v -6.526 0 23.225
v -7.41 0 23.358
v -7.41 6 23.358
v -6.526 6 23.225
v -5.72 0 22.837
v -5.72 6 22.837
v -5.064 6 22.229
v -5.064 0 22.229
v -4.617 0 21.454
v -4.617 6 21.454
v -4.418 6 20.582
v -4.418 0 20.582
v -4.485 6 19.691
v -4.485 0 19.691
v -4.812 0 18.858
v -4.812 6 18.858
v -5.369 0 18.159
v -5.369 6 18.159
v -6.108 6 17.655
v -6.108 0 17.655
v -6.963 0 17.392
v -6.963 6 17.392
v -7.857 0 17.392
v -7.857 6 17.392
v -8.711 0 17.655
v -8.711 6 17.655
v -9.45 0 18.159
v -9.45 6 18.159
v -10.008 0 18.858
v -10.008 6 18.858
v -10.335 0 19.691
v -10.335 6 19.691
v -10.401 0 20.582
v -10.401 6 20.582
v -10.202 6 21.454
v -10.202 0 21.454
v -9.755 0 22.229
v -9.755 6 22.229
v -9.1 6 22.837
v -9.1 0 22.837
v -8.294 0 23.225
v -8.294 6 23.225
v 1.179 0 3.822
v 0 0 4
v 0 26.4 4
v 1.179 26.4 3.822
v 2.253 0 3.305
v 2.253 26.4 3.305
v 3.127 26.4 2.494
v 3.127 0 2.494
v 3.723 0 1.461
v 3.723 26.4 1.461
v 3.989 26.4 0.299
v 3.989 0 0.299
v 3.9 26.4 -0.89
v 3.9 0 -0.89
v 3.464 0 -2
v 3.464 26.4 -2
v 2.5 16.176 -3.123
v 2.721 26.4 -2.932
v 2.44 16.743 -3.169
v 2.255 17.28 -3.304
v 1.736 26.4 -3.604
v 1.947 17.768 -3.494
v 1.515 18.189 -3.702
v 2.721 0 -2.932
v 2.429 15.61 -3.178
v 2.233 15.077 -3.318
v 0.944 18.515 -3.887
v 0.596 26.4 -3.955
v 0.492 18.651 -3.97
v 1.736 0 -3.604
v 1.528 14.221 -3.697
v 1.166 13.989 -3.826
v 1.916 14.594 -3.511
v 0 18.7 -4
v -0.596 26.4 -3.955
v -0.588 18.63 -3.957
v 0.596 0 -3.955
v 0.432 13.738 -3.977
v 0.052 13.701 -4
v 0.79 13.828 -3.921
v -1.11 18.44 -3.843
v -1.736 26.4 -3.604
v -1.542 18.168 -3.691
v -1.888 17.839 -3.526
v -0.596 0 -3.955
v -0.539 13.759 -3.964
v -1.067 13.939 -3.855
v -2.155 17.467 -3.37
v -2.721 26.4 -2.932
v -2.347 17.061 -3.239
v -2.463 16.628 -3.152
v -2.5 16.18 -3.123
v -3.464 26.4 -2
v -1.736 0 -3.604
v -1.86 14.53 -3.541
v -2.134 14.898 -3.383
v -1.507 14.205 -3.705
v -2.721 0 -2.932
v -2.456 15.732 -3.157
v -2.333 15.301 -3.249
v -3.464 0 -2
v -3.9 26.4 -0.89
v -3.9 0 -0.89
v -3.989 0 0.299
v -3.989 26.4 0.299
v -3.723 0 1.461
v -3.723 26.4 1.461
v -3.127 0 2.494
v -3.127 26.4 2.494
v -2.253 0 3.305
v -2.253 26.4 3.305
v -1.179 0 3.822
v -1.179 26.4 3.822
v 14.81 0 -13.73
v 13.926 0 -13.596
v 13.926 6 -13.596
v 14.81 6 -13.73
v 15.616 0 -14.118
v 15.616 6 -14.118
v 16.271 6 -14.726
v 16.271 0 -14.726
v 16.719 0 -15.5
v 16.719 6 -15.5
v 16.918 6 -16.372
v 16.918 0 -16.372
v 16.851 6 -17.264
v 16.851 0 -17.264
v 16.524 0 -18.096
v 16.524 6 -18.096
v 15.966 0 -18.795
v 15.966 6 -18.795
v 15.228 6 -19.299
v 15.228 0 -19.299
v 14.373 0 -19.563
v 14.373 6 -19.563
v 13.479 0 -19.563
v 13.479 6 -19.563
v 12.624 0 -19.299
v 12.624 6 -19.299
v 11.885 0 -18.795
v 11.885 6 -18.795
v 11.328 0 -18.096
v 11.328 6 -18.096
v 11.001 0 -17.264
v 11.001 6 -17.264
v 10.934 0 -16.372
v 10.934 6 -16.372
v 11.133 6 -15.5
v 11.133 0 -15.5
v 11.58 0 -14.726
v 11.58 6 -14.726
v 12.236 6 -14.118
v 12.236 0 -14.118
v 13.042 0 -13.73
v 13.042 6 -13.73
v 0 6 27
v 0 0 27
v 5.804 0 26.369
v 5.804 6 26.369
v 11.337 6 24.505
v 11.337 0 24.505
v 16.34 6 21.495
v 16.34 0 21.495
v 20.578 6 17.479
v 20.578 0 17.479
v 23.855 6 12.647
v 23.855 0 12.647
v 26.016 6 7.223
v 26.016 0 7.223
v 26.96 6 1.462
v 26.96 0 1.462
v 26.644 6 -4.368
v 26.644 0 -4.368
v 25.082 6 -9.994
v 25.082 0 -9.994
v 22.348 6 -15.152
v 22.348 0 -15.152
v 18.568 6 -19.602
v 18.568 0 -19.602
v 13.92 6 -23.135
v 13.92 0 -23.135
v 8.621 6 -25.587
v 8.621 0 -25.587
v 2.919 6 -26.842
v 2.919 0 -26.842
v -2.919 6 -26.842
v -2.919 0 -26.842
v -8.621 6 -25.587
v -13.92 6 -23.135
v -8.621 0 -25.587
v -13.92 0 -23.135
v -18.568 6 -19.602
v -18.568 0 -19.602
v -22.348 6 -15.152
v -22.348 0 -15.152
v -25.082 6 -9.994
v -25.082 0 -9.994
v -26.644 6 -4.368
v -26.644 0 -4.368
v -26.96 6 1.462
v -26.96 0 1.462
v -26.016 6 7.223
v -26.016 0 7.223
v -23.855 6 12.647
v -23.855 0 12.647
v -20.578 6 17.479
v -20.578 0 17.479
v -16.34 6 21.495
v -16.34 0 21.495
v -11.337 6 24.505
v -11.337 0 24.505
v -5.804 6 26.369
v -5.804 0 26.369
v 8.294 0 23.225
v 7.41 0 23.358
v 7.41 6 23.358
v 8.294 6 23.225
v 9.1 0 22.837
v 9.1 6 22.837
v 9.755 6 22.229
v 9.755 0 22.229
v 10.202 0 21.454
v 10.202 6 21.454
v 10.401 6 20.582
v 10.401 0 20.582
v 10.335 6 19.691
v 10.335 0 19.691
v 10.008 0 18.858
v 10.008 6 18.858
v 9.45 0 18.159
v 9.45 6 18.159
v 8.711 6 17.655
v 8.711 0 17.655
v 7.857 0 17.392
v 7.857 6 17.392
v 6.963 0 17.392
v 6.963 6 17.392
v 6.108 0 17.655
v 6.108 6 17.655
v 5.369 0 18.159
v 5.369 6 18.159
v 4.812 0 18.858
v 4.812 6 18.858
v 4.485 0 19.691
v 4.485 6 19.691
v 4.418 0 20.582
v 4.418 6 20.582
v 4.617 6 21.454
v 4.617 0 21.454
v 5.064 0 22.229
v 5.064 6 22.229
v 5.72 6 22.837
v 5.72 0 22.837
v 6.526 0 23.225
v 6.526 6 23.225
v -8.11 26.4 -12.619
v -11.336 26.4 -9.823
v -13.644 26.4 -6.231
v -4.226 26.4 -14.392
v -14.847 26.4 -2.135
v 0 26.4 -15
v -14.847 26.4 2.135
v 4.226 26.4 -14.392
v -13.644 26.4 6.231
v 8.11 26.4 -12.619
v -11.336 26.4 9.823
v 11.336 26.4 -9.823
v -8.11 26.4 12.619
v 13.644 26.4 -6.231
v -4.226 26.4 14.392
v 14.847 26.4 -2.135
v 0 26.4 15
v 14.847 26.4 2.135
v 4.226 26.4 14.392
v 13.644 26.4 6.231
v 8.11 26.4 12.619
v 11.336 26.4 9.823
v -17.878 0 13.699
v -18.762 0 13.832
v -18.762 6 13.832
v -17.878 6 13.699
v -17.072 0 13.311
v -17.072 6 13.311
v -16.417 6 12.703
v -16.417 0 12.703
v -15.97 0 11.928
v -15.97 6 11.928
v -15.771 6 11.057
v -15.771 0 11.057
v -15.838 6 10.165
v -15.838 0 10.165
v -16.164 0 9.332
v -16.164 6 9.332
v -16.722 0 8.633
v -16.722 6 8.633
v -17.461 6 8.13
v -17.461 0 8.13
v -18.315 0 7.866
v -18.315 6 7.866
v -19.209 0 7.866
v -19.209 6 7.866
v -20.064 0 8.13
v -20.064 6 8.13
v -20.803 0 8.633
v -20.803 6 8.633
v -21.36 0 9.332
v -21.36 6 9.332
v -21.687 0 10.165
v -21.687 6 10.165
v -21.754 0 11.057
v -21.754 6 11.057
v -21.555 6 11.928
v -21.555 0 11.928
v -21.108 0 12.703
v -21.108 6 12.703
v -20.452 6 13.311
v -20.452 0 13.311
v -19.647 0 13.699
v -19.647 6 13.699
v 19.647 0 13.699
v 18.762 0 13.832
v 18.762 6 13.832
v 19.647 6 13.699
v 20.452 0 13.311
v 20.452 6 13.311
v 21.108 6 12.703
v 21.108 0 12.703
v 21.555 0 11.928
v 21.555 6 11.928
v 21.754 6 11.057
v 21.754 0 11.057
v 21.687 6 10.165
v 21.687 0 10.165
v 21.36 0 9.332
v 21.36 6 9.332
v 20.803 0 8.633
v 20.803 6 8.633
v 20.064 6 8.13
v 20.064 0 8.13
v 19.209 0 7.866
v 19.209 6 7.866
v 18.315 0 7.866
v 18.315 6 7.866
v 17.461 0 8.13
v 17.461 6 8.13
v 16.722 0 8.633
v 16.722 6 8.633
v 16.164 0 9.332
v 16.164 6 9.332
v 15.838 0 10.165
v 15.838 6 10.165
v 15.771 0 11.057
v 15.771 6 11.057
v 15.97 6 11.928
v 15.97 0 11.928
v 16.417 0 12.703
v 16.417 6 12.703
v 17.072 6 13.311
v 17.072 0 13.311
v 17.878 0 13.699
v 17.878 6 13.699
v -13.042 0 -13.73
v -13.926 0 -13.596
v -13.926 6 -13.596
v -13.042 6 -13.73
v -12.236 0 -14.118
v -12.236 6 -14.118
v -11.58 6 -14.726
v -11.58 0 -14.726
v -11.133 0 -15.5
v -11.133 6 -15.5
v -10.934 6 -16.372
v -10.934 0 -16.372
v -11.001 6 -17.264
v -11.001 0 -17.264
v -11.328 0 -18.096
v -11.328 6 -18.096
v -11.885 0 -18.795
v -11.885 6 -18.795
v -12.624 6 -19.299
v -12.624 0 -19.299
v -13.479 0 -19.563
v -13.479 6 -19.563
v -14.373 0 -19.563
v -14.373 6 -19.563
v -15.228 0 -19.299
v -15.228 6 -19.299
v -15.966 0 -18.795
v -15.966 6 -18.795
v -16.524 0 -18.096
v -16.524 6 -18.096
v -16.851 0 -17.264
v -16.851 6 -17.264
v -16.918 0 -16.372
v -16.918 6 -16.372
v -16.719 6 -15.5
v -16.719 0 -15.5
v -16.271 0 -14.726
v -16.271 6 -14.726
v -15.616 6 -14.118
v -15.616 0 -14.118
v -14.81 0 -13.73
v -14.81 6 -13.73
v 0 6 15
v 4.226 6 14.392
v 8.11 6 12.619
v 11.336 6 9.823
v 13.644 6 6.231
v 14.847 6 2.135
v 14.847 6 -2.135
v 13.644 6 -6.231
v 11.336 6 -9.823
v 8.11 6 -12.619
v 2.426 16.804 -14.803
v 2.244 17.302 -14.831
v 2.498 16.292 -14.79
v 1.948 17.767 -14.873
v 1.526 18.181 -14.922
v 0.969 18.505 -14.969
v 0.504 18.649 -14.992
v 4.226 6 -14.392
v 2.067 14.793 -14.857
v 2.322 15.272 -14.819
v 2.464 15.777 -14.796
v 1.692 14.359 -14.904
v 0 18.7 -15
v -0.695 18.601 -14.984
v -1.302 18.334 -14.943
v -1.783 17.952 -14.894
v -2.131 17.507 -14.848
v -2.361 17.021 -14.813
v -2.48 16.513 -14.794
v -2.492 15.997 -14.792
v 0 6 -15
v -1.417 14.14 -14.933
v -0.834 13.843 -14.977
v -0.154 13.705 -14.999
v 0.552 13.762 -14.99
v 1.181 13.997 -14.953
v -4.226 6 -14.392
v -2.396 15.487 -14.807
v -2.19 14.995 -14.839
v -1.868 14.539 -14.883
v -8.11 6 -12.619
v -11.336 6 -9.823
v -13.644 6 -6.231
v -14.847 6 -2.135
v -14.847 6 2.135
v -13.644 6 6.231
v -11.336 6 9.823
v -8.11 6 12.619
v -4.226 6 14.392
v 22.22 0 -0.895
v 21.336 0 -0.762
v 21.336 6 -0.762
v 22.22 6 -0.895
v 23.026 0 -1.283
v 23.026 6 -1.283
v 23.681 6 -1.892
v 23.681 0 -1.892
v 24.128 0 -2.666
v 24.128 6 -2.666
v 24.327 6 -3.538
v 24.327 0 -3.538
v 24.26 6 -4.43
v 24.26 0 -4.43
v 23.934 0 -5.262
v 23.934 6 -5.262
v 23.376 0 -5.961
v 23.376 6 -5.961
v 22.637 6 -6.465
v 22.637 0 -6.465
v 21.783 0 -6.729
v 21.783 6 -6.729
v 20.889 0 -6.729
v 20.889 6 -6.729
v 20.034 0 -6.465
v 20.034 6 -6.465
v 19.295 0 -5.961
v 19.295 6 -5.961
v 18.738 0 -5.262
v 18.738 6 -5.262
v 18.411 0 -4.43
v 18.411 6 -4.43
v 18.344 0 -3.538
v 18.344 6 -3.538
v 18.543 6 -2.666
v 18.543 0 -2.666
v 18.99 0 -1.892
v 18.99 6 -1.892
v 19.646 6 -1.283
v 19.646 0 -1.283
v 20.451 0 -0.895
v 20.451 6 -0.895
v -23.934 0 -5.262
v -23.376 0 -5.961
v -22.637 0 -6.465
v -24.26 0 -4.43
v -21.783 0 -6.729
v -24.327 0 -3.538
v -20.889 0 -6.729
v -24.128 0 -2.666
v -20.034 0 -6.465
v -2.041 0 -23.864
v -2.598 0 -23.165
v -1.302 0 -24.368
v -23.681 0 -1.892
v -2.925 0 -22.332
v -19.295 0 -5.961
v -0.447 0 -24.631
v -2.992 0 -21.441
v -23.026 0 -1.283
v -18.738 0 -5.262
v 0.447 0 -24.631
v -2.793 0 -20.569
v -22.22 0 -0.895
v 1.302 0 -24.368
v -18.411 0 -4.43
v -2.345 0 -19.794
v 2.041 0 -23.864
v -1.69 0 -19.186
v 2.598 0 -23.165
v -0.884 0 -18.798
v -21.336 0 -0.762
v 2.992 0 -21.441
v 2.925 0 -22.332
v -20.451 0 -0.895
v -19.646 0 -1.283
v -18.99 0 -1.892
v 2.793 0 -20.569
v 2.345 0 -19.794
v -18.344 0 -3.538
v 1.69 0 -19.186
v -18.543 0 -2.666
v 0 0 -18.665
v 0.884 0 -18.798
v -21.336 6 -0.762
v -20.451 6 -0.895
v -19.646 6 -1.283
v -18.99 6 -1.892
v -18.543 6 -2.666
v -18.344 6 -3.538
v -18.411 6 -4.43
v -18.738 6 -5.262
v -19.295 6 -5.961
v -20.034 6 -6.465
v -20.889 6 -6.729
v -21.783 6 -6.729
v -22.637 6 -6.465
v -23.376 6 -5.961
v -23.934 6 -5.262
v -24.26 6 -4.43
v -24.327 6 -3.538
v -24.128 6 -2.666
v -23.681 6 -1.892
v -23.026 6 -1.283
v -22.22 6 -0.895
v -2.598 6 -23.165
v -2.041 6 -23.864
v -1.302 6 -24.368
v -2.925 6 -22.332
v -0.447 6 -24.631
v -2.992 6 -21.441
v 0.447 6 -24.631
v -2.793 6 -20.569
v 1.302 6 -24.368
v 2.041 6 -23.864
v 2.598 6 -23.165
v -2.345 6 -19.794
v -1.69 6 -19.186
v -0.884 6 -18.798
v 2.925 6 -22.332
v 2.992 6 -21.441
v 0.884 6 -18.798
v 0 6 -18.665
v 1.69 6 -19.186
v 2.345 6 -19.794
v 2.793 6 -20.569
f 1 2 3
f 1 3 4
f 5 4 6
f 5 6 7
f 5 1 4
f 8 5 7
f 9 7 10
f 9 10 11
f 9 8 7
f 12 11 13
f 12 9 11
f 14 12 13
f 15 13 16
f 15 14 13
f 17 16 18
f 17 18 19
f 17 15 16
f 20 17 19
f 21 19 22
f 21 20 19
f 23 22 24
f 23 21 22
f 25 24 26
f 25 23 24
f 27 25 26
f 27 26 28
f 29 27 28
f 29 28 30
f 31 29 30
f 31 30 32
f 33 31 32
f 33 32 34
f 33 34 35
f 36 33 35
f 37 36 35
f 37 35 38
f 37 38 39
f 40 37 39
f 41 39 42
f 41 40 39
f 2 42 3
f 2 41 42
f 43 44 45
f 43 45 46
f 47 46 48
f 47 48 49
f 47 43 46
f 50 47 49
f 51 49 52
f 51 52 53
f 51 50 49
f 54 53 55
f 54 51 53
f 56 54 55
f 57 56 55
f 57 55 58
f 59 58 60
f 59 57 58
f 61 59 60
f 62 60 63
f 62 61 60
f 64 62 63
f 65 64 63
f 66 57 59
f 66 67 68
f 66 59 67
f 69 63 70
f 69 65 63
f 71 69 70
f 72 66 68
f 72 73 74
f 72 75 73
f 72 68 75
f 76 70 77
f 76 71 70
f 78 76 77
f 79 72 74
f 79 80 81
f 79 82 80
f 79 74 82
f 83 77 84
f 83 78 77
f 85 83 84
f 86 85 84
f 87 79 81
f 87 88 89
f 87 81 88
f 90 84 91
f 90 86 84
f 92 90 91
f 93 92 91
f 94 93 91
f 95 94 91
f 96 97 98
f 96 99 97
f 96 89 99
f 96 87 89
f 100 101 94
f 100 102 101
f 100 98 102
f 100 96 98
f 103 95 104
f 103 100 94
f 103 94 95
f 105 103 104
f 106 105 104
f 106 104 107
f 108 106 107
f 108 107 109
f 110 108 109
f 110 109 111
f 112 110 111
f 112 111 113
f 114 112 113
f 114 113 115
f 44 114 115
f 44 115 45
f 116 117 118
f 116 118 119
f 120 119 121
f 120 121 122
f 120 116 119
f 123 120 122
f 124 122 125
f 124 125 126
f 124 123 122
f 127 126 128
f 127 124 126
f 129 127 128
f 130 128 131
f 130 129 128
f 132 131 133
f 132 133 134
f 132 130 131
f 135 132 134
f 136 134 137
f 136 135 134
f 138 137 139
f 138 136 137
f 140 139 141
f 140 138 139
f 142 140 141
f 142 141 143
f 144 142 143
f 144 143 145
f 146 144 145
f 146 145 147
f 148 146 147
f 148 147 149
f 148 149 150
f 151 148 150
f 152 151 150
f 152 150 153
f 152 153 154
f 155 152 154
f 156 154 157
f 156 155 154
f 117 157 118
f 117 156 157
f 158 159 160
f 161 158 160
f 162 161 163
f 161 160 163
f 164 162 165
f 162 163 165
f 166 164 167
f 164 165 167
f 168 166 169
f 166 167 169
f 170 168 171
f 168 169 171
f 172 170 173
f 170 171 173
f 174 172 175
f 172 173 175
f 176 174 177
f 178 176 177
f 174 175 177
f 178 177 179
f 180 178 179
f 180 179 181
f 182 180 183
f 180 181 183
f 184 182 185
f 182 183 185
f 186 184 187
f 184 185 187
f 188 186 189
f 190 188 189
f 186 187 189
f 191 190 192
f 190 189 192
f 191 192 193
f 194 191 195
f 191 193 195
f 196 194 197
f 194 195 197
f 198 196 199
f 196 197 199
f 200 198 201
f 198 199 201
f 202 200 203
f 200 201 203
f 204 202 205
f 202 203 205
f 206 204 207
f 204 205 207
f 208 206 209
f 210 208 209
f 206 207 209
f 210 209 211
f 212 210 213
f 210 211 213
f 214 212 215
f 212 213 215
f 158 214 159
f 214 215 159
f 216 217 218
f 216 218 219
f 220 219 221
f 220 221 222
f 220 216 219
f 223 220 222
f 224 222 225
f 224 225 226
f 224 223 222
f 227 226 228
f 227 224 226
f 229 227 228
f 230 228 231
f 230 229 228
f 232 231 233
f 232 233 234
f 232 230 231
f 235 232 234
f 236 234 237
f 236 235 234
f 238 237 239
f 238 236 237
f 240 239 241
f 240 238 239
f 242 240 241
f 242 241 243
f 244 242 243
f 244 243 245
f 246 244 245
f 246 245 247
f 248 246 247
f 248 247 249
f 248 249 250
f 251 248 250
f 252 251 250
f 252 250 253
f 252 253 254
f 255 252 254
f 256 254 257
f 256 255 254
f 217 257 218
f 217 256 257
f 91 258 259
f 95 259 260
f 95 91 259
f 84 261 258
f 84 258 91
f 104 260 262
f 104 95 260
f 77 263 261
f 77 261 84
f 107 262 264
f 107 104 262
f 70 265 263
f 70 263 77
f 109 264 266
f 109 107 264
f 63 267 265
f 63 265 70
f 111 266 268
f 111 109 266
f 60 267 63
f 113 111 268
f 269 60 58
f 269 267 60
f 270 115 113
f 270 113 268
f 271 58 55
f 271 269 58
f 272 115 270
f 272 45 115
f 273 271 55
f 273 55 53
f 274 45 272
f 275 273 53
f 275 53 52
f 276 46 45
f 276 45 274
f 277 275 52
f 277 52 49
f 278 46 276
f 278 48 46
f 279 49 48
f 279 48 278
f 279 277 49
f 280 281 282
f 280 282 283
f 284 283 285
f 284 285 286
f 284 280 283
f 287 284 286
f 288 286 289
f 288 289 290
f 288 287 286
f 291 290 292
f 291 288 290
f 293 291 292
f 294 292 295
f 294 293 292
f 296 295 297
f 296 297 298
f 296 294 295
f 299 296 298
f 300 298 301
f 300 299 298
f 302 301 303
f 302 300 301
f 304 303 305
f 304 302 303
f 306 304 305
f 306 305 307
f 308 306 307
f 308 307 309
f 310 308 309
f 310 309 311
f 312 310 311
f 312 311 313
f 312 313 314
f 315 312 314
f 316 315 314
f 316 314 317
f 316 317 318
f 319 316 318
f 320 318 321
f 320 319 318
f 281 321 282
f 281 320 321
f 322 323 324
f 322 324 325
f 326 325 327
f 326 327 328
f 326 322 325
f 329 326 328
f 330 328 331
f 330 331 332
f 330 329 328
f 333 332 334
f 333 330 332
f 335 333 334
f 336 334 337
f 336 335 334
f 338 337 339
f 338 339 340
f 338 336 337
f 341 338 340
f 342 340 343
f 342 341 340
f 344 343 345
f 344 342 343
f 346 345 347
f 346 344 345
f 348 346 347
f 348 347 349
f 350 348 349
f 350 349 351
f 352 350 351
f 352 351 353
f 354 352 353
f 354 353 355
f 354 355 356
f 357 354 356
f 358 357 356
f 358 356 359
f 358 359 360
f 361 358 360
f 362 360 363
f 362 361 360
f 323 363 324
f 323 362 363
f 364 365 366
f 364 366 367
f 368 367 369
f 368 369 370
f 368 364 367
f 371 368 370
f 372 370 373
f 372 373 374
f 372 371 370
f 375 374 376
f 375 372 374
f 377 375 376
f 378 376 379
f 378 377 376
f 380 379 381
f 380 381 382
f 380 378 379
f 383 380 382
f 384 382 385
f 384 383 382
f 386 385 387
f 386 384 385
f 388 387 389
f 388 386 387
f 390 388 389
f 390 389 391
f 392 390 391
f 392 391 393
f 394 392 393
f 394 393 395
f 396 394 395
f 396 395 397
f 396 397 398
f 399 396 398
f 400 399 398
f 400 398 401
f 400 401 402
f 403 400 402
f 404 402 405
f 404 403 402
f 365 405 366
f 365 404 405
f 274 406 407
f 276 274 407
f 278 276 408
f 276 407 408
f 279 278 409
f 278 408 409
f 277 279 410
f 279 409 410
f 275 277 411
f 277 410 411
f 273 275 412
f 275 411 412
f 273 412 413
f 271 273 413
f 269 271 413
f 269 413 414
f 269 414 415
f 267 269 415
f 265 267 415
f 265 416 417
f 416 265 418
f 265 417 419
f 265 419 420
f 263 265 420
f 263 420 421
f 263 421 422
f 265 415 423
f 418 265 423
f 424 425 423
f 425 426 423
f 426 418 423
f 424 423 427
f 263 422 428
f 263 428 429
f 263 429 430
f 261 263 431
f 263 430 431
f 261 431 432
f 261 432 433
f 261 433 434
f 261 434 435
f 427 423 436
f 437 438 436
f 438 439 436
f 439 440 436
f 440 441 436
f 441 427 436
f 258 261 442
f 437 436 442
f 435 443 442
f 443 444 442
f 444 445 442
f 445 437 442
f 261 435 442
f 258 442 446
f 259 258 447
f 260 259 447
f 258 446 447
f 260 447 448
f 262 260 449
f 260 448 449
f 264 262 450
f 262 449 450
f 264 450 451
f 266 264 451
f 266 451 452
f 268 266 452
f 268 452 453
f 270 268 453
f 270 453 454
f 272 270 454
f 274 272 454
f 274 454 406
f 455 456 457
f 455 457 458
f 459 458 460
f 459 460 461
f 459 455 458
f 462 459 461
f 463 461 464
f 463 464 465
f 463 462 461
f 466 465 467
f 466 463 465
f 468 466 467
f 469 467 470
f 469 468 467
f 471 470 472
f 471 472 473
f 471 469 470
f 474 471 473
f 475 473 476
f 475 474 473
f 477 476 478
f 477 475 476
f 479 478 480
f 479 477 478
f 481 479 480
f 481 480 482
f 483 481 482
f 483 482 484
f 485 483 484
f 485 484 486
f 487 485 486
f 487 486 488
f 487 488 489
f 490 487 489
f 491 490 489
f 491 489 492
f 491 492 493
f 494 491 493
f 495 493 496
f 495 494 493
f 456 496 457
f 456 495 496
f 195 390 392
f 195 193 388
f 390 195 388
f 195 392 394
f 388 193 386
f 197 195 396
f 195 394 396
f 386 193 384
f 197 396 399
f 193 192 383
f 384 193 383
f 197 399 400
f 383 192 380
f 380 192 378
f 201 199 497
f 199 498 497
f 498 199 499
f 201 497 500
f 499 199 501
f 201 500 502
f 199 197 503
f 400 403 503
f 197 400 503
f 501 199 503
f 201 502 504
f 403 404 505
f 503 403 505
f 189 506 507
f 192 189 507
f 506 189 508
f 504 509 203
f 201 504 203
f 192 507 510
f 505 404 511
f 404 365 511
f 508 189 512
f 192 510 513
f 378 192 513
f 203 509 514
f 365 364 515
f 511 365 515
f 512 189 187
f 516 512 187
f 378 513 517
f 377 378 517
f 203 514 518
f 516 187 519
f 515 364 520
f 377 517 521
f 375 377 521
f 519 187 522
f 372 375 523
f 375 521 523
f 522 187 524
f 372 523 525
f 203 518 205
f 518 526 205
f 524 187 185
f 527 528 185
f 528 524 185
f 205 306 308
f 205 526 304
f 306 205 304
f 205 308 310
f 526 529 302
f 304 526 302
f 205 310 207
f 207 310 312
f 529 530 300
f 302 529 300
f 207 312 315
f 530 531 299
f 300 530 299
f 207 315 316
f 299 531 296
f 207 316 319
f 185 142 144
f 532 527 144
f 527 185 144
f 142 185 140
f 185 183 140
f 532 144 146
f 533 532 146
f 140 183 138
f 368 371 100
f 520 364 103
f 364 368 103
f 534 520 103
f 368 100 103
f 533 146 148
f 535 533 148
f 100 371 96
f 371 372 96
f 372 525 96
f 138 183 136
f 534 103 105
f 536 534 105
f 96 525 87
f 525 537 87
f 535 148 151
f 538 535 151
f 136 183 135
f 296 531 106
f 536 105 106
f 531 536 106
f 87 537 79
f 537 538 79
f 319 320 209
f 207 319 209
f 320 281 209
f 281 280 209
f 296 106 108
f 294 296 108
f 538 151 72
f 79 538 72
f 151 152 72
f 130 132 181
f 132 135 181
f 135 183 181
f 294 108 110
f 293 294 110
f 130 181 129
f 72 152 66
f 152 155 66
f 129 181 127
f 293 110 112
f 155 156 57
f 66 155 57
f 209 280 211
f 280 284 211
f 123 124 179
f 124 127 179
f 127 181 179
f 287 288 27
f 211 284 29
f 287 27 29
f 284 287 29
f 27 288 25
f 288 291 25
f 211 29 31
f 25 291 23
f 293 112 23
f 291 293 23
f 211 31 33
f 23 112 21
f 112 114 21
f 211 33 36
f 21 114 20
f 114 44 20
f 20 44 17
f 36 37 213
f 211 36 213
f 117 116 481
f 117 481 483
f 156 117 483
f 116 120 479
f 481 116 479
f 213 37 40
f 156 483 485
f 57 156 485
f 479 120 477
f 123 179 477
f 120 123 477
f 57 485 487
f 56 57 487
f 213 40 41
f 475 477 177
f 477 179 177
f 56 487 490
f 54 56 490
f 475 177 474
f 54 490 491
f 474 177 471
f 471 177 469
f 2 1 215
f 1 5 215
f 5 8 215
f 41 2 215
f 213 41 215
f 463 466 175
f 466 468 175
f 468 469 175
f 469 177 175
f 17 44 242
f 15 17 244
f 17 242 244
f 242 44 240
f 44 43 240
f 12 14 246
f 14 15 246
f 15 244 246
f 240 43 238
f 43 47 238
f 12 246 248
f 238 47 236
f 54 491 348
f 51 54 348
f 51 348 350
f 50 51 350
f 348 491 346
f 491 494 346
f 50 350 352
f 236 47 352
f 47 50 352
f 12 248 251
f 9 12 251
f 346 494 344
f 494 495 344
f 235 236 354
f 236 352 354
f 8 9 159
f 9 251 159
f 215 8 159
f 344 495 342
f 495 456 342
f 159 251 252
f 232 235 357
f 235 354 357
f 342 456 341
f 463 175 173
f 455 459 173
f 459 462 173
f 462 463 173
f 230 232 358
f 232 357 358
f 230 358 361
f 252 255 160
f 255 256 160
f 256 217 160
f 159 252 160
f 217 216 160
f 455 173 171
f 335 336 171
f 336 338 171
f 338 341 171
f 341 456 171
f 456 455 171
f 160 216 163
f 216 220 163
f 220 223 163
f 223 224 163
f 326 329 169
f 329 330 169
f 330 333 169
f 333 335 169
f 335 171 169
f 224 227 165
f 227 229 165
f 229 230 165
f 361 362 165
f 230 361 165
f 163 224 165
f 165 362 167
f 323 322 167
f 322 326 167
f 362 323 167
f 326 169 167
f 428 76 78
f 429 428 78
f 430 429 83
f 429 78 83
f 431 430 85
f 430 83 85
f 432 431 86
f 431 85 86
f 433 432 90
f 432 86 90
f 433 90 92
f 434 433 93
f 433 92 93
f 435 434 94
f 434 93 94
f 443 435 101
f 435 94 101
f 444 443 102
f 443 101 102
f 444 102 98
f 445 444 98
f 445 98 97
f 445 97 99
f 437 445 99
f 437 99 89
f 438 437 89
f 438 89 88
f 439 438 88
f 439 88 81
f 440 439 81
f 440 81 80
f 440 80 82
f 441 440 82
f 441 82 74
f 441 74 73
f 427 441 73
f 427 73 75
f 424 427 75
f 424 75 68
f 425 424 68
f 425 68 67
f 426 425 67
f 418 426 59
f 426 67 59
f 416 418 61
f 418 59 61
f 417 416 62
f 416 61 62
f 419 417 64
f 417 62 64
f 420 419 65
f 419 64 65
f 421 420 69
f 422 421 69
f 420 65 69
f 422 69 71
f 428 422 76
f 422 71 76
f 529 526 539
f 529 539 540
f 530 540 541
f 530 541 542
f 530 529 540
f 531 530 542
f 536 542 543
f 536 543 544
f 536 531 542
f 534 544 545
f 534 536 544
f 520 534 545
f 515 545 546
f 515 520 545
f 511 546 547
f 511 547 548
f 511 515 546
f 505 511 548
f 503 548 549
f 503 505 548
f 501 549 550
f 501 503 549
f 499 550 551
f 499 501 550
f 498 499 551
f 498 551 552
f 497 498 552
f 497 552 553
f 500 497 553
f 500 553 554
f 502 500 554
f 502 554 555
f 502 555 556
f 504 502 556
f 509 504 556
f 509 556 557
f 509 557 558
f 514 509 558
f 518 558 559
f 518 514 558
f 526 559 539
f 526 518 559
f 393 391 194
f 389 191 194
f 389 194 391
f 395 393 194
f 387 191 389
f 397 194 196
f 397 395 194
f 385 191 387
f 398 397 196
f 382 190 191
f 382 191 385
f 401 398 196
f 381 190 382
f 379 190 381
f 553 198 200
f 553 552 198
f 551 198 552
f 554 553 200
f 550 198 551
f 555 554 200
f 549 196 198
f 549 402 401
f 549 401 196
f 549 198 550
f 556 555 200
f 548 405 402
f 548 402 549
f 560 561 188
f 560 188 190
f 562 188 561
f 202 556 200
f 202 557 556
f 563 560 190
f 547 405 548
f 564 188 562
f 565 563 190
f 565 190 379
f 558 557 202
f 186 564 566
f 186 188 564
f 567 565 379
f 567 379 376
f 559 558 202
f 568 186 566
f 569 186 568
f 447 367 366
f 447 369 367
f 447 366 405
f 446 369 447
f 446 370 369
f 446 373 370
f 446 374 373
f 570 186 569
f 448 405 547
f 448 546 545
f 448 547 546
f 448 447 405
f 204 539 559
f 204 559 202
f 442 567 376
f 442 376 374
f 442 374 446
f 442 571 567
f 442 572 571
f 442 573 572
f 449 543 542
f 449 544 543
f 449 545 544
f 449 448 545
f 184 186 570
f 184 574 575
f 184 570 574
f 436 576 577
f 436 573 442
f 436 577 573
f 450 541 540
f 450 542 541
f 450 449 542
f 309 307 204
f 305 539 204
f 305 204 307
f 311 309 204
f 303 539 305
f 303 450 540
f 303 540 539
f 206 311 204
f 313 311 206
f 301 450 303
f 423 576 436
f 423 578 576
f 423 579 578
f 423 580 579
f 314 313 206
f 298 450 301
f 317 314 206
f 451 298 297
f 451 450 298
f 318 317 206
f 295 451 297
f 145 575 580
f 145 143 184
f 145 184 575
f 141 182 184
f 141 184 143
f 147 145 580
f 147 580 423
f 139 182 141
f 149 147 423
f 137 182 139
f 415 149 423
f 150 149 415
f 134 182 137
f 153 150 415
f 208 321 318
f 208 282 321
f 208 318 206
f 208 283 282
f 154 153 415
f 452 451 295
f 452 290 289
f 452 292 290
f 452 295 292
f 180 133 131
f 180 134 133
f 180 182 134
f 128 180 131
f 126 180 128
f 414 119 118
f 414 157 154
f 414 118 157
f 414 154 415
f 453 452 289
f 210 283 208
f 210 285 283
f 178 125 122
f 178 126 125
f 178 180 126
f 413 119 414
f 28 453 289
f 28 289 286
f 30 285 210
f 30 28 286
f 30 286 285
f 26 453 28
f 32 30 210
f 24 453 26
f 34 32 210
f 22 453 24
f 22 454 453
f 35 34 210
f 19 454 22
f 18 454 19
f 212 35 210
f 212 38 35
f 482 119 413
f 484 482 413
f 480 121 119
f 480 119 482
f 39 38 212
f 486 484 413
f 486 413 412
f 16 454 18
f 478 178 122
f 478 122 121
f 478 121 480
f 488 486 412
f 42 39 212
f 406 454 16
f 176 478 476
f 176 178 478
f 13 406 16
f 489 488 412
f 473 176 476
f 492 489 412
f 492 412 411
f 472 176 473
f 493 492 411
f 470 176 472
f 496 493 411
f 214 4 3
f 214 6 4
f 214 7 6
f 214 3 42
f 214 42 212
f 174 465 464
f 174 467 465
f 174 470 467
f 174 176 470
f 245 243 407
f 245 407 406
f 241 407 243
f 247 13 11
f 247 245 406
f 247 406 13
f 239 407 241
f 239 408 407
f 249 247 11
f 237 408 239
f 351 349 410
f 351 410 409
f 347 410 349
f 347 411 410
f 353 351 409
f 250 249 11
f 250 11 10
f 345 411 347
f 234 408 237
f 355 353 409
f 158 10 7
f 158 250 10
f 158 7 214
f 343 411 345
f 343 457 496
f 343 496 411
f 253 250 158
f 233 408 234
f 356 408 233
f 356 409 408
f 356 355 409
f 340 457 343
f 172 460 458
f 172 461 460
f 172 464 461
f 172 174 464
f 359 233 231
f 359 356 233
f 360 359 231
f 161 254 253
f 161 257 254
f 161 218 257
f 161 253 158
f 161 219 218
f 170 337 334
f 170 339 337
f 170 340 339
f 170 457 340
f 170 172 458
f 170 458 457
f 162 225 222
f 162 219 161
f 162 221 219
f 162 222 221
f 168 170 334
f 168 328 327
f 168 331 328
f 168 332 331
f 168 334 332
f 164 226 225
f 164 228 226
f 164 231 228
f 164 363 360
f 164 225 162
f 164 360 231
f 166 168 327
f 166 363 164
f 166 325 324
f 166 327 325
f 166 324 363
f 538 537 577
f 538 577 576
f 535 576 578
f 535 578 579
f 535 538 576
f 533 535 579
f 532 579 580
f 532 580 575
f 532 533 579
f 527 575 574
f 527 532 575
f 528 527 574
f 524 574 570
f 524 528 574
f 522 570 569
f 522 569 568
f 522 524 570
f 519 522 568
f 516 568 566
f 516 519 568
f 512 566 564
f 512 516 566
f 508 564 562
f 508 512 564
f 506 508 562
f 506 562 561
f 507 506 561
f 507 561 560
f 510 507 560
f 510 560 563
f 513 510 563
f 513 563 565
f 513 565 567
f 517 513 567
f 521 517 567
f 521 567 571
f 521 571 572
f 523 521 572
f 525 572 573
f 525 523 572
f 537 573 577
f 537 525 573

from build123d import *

# Parameters (mm, degrees)
SKETCH_1_R          = 27
SKETCH_1_R_2        = 3
SKETCH_1_R_3        = 4
EXTRUDE_1_DEPTH     = 6
SKETCH_3_R          = 15
SKETCH_3_R_2        = 4
EXTRUDE_2_DEPTH     = 20.4
SKETCH_5_R          = 2.5
CUT_EXTRUDE_1_DEPTH = 47.421546721


with BuildPart() as part:
    # 草图1 → 凸台-拉伸1 (new body)
    with BuildSketch(Plane(origin=(0, 0, 0), x_dir=(1, 0, 0), z_dir=(0, 1, 0))):
        with Locations(Location((0, 0, 0), (0, 0, 270))):
            Circle(SKETCH_1_R)
        with Locations(Location((0, 21.6648374, 0), (0, 0, 270))):
            Circle(SKETCH_1_R_2, mode=Mode.SUBTRACT)
        with Locations(Location((13.925889047, 16.596228301, 0), (0, 0, 270))):
            Circle(SKETCH_1_R_2, mode=Mode.SUBTRACT)
        with Locations(Location((21.335699839, 3.762059534, 0), (0, 0, 270))):
            Circle(SKETCH_1_R_2, mode=Mode.SUBTRACT)
        with Locations(Location((18.762299557, -10.8324187, 0), (0, 0, 270))):
            Circle(SKETCH_1_R_2, mode=Mode.SUBTRACT)
        with Locations(Location((7.409810793, -20.358287835, 0), (0, 0, 270))):
            Circle(SKETCH_1_R_2, mode=Mode.SUBTRACT)
        with Locations(Location((-7.409810793, -20.358287835, 0), (0, 0, 270))):
            Circle(SKETCH_1_R_2, mode=Mode.SUBTRACT)
        with Locations(Location((-18.762299557, -10.8324187, 0), (0, 0, 270))):
            Circle(SKETCH_1_R_2, mode=Mode.SUBTRACT)
        with Locations(Location((-21.335699839, 3.762059534, 0), (0, 0, 270))):
            Circle(SKETCH_1_R_2, mode=Mode.SUBTRACT)
        with Locations(Location((-13.925889047, 16.596228301, 0), (0, 0, 270))):
            Circle(SKETCH_1_R_2, mode=Mode.SUBTRACT)
        with Locations(Location((0, 0, 0), (0, 0, 270))):
            Circle(SKETCH_1_R_3, mode=Mode.SUBTRACT)
    extrude(amount=EXTRUDE_1_DEPTH)

    # 草图3 → 凸台-拉伸2 (add)
    with BuildSketch(Plane(origin=(0, 6, 0), x_dir=(1, 0, 0), z_dir=(0, 1, 0))):
        with Locations(Location((0, 0, 0), (0, 0, 270))):
            Circle(SKETCH_3_R)
        with Locations(Location((0, 0, 0), (0, 0, 270))):
            Circle(SKETCH_3_R_2, mode=Mode.SUBTRACT)
    extrude(amount=EXTRUDE_2_DEPTH)

    # 草图5 → 切除-拉伸1 (cut, through all)
    with BuildSketch(Plane(origin=(0, 0, 0), x_dir=(0, 1, 0), z_dir=(0, 0, 1))):
        with Locations((16.2, 0)):
            Circle(SKETCH_5_R)
    extrude(amount=-CUT_EXTRUDE_1_DEPTH, mode=Mode.SUBTRACT)


solid = part.part
